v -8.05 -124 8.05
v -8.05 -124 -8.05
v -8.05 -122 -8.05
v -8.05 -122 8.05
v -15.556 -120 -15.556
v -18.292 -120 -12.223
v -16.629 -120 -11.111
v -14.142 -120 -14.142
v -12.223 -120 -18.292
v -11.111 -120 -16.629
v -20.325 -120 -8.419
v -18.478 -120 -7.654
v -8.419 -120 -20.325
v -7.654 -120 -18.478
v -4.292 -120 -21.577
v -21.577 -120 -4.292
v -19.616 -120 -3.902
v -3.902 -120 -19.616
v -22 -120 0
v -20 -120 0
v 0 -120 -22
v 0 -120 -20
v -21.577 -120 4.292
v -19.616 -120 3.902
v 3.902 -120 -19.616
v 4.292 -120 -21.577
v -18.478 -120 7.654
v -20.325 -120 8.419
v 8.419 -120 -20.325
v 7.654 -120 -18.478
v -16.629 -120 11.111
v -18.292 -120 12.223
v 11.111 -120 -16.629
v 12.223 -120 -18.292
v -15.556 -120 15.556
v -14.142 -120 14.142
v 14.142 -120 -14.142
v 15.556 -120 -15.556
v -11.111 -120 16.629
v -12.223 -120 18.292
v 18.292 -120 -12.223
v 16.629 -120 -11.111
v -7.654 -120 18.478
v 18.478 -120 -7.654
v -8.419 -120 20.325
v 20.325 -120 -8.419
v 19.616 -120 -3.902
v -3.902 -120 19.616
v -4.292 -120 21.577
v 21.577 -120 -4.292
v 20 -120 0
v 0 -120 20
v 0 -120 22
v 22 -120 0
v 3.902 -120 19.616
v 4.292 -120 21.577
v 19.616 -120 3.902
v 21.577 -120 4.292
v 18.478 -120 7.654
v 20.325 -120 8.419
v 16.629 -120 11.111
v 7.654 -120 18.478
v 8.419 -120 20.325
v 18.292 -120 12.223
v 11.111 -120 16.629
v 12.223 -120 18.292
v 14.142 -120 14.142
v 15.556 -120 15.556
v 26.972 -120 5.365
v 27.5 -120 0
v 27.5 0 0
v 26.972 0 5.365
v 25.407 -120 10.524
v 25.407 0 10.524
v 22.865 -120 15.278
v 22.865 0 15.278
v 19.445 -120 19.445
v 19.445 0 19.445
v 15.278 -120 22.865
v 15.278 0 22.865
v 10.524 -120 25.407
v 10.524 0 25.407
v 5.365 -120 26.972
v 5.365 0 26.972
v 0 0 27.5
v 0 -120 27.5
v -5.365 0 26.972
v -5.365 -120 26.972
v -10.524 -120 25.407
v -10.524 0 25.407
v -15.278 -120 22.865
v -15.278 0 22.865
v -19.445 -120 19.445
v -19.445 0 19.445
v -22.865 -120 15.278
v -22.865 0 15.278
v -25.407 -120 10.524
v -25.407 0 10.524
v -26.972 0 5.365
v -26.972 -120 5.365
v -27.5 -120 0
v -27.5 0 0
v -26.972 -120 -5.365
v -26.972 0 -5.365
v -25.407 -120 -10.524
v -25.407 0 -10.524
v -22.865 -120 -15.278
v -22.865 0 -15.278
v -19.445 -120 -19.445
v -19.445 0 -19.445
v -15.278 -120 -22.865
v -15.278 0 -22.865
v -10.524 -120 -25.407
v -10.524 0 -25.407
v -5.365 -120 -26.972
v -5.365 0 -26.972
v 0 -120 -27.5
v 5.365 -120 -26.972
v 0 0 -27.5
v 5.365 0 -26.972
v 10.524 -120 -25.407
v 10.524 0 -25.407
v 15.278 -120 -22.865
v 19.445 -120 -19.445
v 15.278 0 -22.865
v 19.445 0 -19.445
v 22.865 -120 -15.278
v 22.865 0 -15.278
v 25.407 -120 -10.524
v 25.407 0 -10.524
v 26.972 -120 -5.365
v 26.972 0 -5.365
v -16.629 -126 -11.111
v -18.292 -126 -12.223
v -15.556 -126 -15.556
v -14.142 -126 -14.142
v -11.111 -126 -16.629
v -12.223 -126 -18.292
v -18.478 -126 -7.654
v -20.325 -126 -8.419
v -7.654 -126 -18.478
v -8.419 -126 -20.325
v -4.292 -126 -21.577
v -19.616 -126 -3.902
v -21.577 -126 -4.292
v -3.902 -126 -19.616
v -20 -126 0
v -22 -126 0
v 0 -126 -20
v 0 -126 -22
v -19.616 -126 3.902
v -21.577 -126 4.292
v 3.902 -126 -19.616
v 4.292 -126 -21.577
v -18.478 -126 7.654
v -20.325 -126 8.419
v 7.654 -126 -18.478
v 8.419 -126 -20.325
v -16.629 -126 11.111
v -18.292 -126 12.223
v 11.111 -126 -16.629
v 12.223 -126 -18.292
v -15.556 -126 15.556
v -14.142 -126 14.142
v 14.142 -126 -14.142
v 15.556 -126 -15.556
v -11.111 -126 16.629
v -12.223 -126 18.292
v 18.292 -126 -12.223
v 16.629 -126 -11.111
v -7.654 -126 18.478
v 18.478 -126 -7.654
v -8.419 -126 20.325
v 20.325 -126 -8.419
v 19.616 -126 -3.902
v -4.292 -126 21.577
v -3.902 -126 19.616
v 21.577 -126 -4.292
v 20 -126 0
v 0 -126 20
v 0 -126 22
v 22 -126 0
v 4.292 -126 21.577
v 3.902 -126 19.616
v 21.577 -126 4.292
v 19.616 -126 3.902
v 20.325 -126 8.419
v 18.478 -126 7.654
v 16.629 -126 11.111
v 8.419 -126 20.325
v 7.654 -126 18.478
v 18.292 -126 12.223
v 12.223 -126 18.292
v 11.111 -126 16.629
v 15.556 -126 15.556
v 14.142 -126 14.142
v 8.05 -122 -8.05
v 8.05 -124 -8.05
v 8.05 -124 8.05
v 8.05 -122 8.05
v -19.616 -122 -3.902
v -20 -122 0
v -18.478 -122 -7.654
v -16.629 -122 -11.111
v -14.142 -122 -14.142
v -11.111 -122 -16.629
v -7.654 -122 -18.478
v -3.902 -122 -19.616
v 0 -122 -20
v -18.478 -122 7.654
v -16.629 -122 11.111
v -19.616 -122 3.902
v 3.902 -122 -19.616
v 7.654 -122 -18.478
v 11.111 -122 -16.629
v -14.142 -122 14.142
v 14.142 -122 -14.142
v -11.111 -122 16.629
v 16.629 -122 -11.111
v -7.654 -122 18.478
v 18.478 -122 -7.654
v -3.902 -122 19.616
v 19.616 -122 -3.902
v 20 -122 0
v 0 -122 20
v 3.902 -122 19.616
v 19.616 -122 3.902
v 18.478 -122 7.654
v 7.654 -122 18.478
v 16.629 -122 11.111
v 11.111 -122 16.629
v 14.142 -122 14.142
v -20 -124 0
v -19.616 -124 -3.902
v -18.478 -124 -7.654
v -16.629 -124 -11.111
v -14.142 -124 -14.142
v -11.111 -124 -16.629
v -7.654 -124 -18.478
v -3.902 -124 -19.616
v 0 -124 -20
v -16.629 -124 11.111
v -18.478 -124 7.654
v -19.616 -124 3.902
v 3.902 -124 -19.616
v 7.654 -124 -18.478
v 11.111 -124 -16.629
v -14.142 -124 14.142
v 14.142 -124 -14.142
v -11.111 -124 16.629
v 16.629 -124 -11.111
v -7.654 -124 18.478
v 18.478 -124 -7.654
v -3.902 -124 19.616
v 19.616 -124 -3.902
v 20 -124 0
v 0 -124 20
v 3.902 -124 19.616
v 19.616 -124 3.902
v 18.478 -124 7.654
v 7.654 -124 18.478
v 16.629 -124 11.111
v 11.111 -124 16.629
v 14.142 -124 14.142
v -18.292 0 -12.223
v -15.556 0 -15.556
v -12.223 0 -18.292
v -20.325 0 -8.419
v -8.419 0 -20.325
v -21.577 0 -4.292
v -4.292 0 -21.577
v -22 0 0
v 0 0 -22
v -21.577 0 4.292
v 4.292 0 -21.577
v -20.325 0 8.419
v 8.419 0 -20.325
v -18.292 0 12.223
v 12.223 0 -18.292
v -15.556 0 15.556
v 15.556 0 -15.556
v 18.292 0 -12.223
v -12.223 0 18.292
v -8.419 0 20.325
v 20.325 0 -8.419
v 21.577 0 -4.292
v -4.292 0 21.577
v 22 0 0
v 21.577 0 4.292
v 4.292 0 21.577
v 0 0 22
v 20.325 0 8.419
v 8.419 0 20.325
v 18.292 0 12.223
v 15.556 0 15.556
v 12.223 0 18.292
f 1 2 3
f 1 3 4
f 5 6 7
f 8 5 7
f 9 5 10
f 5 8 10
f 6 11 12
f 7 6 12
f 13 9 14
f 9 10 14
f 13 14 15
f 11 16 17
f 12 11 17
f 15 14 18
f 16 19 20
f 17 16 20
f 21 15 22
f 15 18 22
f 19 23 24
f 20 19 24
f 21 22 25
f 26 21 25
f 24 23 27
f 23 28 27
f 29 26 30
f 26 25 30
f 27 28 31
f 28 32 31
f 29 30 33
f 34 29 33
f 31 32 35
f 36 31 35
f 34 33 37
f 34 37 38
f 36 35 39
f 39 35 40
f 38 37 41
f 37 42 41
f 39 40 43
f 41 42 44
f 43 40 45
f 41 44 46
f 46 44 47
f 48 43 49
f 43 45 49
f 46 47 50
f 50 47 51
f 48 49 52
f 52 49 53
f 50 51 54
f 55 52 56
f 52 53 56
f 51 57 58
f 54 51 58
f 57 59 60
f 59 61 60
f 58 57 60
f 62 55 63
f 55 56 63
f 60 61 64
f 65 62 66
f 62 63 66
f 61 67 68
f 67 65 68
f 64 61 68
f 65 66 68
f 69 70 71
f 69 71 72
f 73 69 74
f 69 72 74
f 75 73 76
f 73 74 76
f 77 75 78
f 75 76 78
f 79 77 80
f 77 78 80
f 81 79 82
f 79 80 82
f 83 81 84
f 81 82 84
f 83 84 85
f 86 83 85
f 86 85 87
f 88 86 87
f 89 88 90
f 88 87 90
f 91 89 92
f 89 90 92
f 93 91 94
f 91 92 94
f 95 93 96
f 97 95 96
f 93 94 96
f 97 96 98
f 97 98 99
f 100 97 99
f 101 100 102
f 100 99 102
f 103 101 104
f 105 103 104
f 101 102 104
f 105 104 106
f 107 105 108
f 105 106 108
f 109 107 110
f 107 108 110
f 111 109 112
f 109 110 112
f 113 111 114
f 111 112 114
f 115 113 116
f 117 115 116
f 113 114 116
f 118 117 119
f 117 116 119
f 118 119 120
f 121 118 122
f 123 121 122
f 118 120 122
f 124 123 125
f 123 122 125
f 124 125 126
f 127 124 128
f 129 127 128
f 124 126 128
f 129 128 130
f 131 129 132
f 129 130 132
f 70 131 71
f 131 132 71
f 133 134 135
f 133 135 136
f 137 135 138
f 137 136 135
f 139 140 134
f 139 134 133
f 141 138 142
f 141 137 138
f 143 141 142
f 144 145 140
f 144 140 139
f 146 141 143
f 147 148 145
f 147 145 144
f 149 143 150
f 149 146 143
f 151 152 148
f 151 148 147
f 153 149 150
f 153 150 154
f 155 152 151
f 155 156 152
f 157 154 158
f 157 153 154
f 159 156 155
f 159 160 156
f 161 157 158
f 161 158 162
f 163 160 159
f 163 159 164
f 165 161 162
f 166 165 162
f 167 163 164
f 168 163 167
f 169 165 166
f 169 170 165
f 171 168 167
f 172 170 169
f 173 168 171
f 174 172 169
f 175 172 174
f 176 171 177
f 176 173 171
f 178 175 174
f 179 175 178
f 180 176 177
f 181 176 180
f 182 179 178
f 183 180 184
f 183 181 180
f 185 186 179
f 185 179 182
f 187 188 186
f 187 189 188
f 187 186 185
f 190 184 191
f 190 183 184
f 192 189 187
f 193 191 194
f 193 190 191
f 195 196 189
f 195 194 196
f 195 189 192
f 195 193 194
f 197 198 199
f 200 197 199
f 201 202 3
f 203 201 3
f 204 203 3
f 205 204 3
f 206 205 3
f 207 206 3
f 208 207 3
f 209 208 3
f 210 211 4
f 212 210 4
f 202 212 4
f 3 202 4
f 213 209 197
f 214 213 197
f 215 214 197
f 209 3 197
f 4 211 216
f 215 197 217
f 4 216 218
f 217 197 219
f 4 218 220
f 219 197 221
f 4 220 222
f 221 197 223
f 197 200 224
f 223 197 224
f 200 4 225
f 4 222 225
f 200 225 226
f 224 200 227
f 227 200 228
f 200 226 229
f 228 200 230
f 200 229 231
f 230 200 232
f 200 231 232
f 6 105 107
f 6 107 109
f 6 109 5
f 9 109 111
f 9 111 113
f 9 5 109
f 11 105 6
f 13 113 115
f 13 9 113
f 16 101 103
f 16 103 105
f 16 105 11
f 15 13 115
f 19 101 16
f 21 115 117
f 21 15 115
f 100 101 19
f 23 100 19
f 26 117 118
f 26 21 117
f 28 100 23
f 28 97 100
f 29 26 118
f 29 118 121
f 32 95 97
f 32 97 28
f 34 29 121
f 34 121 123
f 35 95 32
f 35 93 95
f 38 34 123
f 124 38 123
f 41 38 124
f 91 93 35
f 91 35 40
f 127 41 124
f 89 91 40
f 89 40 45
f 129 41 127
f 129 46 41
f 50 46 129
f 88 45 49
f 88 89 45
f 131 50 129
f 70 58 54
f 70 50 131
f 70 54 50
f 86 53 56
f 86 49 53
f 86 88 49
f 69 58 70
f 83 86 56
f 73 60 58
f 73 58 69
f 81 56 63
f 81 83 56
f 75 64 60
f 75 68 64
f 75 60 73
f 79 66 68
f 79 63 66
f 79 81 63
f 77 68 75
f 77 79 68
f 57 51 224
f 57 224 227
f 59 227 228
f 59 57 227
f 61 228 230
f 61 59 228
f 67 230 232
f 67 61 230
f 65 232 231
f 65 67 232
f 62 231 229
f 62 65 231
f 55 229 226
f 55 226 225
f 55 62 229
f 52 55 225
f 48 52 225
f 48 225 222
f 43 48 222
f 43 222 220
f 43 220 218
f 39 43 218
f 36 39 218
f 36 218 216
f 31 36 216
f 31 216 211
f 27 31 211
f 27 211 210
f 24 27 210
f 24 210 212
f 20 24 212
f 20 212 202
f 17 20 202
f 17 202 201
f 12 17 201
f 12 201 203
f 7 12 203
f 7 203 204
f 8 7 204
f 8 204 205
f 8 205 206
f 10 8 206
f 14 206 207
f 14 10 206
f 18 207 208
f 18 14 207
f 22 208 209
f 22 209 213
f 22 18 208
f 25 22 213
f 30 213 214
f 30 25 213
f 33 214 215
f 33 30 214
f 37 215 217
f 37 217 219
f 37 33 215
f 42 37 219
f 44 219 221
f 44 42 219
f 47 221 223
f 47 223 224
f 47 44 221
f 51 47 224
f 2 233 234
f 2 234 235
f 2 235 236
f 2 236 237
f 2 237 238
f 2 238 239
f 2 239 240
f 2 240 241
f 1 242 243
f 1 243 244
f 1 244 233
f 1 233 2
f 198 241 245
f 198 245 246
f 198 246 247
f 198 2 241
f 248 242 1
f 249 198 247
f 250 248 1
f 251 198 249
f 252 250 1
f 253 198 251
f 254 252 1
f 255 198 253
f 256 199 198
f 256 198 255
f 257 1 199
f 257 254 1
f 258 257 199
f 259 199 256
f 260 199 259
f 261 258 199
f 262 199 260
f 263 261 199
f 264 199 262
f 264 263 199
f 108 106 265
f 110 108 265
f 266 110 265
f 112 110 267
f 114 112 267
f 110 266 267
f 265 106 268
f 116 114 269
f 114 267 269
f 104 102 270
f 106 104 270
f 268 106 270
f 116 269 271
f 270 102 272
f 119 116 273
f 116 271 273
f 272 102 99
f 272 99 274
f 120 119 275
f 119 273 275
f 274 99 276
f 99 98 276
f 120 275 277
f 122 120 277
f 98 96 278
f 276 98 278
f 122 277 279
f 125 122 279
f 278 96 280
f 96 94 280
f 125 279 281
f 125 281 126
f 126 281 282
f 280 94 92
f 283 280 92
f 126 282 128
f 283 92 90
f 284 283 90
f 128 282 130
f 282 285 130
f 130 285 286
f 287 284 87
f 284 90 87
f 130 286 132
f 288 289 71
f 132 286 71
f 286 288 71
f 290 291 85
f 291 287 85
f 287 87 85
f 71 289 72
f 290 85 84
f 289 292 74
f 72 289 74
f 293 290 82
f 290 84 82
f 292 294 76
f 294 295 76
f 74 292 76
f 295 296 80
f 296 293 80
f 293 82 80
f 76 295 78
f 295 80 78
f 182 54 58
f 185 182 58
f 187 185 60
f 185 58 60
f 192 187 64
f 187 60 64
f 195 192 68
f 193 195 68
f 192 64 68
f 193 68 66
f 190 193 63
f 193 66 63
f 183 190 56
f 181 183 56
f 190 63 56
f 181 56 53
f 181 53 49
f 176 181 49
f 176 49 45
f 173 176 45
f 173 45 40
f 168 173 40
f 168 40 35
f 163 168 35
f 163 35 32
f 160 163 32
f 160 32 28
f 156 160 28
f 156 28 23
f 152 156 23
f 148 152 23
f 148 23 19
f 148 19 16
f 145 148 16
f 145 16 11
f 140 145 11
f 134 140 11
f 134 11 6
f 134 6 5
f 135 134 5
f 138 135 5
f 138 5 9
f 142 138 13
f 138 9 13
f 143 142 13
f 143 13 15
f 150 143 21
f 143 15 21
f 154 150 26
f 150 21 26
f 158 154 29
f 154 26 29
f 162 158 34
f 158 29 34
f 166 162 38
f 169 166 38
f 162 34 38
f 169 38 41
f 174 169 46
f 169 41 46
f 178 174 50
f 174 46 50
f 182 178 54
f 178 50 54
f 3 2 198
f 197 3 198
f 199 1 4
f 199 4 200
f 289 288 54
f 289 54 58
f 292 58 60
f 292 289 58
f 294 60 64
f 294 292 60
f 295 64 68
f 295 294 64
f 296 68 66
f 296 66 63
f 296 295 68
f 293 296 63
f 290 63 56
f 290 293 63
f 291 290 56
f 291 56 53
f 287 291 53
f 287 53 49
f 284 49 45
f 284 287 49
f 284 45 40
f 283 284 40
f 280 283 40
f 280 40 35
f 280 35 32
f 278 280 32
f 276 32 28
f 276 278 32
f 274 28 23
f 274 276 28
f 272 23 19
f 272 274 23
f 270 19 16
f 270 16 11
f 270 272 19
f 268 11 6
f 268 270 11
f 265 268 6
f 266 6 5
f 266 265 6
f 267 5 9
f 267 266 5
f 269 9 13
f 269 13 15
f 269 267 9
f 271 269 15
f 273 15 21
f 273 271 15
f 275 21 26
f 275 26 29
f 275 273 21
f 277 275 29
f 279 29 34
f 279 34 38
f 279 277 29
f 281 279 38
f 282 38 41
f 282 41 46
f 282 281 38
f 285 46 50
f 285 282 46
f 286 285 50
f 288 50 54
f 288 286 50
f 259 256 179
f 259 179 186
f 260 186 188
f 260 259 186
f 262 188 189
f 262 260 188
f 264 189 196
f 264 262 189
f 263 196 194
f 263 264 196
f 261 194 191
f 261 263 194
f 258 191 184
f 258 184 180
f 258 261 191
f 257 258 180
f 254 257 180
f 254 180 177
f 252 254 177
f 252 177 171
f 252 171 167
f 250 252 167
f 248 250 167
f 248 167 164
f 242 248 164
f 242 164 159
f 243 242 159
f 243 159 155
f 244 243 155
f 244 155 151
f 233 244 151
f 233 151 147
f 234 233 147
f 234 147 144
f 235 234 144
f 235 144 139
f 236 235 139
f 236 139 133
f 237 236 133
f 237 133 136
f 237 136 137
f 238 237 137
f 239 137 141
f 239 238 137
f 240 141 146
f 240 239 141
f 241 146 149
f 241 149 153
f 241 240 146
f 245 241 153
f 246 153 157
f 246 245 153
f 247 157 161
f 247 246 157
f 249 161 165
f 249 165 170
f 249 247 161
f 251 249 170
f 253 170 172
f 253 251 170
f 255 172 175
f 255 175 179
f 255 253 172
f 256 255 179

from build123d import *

# Parameters (mm, degrees)
F1_R     = 27.5
F1_R_2   = 22
F2_DEPTH = 120
F3_R     = 22
F3_R_2   = 20
F4_DEPTH = 6
F6_DEPTH = 2
F7_R     = 20
F7_W     = 16.1
F7_H     = 16.1
F8_DEPTH = 2


with BuildPart() as f2:
    # F1 (on Front) → F2 (new body)
    with BuildSketch(Plane.XZ):
        Circle(F1_R)
        Circle(F1_R_2, mode=Mode.SUBTRACT)
    extrude(amount=F2_DEPTH)



with BuildPart() as f4:
    # F3 (on face) → F4 (new body)
    with BuildSketch(Plane.XZ.offset(120)):
        Circle(F3_R)
        Circle(F3_R_2, mode=Mode.SUBTRACT)
    extrude(amount=F4_DEPTH)


with BuildPart() as f2_1:
    add(f2.part)

    add(f4.part)  # F6 merges F4
    # F3 (on face) → F6 (join)
    with BuildSketch(Plane.XZ.offset(120)):
        Circle(F3_R)
        Circle(F3_R_2, mode=Mode.SUBTRACT)
    extrude(amount=F6_DEPTH)

    # F7 (on offset) → F8 (join)
    with BuildSketch(Plane.XZ.offset(124)):
        Circle(F7_R)
        Rectangle(F7_W, F7_H, mode=Mode.SUBTRACT)
    extrude(amount=-F8_DEPTH)


solid = f2_1.part
